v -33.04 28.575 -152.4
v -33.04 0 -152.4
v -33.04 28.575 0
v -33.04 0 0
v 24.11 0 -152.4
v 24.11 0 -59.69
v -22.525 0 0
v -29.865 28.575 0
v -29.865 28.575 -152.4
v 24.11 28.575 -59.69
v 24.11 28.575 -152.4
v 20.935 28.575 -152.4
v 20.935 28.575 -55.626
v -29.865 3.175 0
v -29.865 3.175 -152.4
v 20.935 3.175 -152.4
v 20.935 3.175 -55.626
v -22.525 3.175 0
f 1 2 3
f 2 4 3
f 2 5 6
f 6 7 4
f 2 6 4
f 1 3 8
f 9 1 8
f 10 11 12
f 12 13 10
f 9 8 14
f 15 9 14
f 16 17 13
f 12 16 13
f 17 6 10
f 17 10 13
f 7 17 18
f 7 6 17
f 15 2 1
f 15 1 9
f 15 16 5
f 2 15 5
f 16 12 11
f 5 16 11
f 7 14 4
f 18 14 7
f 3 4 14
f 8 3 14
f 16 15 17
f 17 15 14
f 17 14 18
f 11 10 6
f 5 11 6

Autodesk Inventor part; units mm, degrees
ref_plane "YZ Plane" through (0, 0, 0) normal (1, 0, 0) x (0, 1, 0)
ref_plane "XZ Plane" through (0, 0, 0) normal (0, 1, 0) x (-1, 0, 0)
ref_plane "XY Plane" through (0, 0, 0) normal (0, 0, 1) x (1, 0, 0)
sketch "Sketch1" plane through (0, 0, 0) normal (0, 0, 1) x (1, 0, 0)
  line L0 (24.1101, 28.575) -> (24.1101, 0)
  line L1 (24.1101, 0) -> (-33.0399, 0)
  line L2 (-33.0399, 0) -> (-33.0399, 28.575)
  line L3 (-29.8649, 28.575) -> (-29.8649, 3.175)
  line L4 (-29.8649, 3.175) -> (20.9351, 3.175)
  line L5 (20.9351, 3.175) -> (20.9351, 28.575)
  line L6 (-33.0399, 28.575) -> (-29.8649, 28.575)
  line L7 (24.1101, 28.575) -> (20.9351, 28.575)
  point P0 (0, 0)
  dimension "d0" = 57.15
  dimension "d1" = 28.575
  dimension "d2" = 3.175
  dimension "d18" = 28.575
extrude "Extrusion1" add sketch "Sketch1" against normal blind 152.4
sketch "Sketch5" plane through (-33.0399, 0, 0) normal (0, -1, 0) x (1, 0, 0)
  line L0 (0, 0) -> (57.15, 0) projected
  line L1 (57.15, 0) -> (57.15, -152.4) projected
  line L2 (57.15, -152.4) -> (57.15, -59.69)
  line L3 (57.15, 0) -> (57.15, -152.4) projected
  line L4 (57.15, -59.69) -> (10.5151, 0)
  line L5 (10.5151, 0) -> (57.15, 0)
  line L6 (57.15, 0) -> (57.15, -59.69)
  point P0 (33.0399, 0)
  dimension "d14" = 92.71
  dimension "d15" = 38
extrude "Extrusion4" cut sketch "Sketch5" against normal through all
properties part number "Horizontal channel right" material "Aluminum 6061"
